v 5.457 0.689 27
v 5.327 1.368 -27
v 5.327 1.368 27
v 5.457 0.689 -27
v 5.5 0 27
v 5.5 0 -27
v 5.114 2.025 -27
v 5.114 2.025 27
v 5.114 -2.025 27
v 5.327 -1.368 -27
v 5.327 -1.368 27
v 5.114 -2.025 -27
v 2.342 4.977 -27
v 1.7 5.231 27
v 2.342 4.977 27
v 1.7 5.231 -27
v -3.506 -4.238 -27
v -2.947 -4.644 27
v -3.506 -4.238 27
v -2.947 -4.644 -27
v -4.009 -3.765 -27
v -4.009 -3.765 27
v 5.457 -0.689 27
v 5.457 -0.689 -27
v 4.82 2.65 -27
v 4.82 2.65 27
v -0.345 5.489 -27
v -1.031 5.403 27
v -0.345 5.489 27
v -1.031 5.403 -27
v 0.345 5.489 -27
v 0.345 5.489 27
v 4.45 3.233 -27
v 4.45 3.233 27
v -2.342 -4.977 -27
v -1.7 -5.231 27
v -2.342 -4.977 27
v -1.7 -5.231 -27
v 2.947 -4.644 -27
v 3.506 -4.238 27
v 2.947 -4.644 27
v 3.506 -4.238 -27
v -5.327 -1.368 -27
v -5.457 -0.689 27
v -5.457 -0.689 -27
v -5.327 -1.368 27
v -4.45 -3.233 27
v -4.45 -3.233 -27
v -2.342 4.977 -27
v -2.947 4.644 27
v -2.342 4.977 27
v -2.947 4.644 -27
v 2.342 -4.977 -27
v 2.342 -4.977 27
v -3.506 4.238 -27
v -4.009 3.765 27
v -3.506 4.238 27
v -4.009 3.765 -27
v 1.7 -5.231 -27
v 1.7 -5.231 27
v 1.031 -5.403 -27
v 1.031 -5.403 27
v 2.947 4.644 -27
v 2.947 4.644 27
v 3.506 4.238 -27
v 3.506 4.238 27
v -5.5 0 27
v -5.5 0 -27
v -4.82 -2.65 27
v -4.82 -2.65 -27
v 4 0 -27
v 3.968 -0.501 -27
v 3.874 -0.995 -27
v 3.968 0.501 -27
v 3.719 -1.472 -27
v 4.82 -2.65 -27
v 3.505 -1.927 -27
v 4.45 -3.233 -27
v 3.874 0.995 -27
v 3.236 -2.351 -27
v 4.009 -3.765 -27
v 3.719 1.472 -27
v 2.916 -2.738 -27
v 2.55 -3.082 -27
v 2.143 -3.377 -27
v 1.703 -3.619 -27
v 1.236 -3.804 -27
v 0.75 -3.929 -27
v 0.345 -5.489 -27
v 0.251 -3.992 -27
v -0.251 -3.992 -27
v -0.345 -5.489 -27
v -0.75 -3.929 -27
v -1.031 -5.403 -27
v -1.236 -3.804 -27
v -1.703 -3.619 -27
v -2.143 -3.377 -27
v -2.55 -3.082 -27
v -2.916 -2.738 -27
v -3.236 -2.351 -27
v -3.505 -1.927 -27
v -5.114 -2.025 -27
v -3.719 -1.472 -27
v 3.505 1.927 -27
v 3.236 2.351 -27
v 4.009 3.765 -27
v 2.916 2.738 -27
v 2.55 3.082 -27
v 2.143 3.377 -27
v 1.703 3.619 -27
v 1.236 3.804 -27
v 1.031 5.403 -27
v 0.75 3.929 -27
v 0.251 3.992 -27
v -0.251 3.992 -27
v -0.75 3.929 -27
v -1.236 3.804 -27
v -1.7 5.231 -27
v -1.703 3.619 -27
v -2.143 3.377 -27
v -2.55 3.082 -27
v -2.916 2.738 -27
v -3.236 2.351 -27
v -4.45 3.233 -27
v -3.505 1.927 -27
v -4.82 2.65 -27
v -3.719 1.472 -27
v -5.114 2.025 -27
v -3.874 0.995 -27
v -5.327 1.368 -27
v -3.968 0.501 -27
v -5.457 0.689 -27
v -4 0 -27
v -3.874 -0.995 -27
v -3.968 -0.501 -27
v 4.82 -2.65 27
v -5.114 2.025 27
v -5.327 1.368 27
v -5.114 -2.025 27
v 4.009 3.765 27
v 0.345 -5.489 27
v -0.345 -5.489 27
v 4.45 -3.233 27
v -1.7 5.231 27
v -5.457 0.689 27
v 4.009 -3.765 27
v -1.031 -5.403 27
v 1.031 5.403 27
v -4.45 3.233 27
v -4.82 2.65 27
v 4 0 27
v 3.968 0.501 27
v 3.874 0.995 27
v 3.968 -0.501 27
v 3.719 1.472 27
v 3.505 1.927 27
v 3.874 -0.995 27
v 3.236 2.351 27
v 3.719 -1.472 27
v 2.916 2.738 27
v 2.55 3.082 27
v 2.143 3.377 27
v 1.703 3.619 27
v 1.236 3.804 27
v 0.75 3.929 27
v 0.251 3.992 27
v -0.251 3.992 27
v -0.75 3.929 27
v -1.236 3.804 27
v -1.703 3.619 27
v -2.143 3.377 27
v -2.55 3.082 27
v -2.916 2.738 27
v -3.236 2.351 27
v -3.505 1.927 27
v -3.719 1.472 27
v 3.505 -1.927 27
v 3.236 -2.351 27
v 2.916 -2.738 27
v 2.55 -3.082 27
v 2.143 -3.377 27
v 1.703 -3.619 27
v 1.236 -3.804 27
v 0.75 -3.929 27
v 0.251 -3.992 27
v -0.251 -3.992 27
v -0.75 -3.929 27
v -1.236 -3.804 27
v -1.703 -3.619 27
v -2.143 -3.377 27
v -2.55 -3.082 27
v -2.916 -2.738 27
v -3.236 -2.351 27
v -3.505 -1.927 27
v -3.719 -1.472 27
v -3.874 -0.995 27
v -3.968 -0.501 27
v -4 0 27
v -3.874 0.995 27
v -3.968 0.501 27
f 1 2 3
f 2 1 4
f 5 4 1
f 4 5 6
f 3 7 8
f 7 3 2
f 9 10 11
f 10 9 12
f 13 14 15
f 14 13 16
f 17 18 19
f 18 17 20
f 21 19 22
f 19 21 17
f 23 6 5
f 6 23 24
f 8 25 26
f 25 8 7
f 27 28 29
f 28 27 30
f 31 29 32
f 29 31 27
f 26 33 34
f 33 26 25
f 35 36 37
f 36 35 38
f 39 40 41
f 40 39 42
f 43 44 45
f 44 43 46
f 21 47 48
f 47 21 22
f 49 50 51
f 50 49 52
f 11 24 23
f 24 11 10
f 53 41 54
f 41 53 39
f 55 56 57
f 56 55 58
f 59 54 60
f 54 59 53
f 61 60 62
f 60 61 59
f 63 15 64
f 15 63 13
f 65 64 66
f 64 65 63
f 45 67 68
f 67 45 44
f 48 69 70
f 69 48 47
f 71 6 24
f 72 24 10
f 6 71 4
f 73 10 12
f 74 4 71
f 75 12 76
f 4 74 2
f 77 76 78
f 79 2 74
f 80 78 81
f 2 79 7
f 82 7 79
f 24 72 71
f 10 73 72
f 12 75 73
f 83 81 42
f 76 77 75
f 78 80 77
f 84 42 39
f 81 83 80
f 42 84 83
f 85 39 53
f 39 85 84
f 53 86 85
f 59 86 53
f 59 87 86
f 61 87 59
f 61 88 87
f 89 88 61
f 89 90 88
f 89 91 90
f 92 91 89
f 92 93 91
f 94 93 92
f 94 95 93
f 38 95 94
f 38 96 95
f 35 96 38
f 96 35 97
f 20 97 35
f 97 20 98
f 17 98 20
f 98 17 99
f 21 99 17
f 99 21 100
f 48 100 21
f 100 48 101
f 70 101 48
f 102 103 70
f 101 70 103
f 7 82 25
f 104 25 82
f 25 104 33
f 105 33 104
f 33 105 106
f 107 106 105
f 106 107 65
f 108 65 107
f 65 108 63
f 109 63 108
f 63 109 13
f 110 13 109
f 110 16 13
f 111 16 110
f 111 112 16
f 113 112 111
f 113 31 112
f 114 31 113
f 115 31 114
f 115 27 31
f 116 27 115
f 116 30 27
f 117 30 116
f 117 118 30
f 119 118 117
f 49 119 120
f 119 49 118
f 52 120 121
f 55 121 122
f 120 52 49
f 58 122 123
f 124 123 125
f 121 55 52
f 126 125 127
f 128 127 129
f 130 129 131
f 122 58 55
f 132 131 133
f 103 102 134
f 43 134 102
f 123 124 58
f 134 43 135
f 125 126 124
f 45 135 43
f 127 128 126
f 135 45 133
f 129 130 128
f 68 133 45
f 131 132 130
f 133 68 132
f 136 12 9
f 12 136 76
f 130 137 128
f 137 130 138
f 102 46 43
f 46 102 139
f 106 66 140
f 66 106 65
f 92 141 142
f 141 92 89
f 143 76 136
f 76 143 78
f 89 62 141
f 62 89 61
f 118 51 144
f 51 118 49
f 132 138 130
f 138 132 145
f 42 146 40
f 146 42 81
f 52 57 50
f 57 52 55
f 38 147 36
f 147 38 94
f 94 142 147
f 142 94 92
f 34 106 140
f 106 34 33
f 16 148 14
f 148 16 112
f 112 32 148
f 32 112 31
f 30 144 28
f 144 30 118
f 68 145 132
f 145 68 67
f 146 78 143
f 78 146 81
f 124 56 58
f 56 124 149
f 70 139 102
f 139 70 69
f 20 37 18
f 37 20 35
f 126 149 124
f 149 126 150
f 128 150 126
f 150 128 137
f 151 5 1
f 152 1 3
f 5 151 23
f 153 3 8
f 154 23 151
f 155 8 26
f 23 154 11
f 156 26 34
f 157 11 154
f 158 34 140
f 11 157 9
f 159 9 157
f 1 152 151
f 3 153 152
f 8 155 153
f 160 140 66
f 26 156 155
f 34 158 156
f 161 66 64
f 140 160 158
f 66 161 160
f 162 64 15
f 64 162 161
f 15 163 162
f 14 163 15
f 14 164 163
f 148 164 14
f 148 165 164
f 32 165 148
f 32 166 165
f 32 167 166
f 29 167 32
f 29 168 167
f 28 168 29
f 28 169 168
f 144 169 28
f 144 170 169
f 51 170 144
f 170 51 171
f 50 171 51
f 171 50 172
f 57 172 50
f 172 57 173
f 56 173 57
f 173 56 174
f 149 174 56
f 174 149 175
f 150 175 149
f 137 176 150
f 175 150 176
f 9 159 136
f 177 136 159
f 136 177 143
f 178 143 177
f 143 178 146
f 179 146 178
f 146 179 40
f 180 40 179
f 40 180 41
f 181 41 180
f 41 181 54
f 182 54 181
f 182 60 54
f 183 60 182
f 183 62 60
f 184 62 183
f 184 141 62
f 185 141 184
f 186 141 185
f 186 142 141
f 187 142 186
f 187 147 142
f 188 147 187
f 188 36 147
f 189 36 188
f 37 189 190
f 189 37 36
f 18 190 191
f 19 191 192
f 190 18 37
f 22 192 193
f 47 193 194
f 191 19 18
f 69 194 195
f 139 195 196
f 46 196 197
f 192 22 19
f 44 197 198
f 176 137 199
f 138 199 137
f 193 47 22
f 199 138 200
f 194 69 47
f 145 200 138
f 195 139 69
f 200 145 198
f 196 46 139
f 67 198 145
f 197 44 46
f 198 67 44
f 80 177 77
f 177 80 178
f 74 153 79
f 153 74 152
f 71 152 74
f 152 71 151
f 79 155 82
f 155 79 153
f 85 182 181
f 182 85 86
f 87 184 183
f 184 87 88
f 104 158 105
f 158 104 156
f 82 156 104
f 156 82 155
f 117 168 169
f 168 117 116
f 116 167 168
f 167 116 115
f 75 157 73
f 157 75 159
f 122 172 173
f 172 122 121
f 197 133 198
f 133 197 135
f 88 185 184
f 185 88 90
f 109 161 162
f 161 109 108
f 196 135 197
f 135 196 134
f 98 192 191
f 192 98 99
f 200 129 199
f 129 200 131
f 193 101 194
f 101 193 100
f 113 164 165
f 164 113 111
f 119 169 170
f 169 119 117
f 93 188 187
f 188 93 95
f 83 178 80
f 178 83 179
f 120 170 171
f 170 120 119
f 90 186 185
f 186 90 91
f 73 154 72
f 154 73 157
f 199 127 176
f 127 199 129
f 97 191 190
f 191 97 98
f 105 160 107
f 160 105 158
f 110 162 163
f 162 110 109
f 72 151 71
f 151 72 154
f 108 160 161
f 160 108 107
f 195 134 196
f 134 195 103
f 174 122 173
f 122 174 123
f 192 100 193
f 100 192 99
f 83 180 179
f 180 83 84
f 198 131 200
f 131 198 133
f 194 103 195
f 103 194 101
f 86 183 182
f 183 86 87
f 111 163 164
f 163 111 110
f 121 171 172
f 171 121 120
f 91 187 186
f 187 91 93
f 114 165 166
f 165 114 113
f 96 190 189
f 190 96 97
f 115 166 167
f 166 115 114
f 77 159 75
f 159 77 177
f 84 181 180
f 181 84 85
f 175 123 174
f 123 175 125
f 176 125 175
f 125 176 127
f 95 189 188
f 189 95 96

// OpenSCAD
$fn = 50;


difference() {
	union() {
		translate(v = [0, 0, -27.0000000000]) {
			cylinder(h = 54, r = 5.5000000000);
		}
	}
	union() {
		translate(v = [0, 0, -100.0000000000]) {
			cylinder(h = 200, r = 4.0000000000);
		}
	}
}
